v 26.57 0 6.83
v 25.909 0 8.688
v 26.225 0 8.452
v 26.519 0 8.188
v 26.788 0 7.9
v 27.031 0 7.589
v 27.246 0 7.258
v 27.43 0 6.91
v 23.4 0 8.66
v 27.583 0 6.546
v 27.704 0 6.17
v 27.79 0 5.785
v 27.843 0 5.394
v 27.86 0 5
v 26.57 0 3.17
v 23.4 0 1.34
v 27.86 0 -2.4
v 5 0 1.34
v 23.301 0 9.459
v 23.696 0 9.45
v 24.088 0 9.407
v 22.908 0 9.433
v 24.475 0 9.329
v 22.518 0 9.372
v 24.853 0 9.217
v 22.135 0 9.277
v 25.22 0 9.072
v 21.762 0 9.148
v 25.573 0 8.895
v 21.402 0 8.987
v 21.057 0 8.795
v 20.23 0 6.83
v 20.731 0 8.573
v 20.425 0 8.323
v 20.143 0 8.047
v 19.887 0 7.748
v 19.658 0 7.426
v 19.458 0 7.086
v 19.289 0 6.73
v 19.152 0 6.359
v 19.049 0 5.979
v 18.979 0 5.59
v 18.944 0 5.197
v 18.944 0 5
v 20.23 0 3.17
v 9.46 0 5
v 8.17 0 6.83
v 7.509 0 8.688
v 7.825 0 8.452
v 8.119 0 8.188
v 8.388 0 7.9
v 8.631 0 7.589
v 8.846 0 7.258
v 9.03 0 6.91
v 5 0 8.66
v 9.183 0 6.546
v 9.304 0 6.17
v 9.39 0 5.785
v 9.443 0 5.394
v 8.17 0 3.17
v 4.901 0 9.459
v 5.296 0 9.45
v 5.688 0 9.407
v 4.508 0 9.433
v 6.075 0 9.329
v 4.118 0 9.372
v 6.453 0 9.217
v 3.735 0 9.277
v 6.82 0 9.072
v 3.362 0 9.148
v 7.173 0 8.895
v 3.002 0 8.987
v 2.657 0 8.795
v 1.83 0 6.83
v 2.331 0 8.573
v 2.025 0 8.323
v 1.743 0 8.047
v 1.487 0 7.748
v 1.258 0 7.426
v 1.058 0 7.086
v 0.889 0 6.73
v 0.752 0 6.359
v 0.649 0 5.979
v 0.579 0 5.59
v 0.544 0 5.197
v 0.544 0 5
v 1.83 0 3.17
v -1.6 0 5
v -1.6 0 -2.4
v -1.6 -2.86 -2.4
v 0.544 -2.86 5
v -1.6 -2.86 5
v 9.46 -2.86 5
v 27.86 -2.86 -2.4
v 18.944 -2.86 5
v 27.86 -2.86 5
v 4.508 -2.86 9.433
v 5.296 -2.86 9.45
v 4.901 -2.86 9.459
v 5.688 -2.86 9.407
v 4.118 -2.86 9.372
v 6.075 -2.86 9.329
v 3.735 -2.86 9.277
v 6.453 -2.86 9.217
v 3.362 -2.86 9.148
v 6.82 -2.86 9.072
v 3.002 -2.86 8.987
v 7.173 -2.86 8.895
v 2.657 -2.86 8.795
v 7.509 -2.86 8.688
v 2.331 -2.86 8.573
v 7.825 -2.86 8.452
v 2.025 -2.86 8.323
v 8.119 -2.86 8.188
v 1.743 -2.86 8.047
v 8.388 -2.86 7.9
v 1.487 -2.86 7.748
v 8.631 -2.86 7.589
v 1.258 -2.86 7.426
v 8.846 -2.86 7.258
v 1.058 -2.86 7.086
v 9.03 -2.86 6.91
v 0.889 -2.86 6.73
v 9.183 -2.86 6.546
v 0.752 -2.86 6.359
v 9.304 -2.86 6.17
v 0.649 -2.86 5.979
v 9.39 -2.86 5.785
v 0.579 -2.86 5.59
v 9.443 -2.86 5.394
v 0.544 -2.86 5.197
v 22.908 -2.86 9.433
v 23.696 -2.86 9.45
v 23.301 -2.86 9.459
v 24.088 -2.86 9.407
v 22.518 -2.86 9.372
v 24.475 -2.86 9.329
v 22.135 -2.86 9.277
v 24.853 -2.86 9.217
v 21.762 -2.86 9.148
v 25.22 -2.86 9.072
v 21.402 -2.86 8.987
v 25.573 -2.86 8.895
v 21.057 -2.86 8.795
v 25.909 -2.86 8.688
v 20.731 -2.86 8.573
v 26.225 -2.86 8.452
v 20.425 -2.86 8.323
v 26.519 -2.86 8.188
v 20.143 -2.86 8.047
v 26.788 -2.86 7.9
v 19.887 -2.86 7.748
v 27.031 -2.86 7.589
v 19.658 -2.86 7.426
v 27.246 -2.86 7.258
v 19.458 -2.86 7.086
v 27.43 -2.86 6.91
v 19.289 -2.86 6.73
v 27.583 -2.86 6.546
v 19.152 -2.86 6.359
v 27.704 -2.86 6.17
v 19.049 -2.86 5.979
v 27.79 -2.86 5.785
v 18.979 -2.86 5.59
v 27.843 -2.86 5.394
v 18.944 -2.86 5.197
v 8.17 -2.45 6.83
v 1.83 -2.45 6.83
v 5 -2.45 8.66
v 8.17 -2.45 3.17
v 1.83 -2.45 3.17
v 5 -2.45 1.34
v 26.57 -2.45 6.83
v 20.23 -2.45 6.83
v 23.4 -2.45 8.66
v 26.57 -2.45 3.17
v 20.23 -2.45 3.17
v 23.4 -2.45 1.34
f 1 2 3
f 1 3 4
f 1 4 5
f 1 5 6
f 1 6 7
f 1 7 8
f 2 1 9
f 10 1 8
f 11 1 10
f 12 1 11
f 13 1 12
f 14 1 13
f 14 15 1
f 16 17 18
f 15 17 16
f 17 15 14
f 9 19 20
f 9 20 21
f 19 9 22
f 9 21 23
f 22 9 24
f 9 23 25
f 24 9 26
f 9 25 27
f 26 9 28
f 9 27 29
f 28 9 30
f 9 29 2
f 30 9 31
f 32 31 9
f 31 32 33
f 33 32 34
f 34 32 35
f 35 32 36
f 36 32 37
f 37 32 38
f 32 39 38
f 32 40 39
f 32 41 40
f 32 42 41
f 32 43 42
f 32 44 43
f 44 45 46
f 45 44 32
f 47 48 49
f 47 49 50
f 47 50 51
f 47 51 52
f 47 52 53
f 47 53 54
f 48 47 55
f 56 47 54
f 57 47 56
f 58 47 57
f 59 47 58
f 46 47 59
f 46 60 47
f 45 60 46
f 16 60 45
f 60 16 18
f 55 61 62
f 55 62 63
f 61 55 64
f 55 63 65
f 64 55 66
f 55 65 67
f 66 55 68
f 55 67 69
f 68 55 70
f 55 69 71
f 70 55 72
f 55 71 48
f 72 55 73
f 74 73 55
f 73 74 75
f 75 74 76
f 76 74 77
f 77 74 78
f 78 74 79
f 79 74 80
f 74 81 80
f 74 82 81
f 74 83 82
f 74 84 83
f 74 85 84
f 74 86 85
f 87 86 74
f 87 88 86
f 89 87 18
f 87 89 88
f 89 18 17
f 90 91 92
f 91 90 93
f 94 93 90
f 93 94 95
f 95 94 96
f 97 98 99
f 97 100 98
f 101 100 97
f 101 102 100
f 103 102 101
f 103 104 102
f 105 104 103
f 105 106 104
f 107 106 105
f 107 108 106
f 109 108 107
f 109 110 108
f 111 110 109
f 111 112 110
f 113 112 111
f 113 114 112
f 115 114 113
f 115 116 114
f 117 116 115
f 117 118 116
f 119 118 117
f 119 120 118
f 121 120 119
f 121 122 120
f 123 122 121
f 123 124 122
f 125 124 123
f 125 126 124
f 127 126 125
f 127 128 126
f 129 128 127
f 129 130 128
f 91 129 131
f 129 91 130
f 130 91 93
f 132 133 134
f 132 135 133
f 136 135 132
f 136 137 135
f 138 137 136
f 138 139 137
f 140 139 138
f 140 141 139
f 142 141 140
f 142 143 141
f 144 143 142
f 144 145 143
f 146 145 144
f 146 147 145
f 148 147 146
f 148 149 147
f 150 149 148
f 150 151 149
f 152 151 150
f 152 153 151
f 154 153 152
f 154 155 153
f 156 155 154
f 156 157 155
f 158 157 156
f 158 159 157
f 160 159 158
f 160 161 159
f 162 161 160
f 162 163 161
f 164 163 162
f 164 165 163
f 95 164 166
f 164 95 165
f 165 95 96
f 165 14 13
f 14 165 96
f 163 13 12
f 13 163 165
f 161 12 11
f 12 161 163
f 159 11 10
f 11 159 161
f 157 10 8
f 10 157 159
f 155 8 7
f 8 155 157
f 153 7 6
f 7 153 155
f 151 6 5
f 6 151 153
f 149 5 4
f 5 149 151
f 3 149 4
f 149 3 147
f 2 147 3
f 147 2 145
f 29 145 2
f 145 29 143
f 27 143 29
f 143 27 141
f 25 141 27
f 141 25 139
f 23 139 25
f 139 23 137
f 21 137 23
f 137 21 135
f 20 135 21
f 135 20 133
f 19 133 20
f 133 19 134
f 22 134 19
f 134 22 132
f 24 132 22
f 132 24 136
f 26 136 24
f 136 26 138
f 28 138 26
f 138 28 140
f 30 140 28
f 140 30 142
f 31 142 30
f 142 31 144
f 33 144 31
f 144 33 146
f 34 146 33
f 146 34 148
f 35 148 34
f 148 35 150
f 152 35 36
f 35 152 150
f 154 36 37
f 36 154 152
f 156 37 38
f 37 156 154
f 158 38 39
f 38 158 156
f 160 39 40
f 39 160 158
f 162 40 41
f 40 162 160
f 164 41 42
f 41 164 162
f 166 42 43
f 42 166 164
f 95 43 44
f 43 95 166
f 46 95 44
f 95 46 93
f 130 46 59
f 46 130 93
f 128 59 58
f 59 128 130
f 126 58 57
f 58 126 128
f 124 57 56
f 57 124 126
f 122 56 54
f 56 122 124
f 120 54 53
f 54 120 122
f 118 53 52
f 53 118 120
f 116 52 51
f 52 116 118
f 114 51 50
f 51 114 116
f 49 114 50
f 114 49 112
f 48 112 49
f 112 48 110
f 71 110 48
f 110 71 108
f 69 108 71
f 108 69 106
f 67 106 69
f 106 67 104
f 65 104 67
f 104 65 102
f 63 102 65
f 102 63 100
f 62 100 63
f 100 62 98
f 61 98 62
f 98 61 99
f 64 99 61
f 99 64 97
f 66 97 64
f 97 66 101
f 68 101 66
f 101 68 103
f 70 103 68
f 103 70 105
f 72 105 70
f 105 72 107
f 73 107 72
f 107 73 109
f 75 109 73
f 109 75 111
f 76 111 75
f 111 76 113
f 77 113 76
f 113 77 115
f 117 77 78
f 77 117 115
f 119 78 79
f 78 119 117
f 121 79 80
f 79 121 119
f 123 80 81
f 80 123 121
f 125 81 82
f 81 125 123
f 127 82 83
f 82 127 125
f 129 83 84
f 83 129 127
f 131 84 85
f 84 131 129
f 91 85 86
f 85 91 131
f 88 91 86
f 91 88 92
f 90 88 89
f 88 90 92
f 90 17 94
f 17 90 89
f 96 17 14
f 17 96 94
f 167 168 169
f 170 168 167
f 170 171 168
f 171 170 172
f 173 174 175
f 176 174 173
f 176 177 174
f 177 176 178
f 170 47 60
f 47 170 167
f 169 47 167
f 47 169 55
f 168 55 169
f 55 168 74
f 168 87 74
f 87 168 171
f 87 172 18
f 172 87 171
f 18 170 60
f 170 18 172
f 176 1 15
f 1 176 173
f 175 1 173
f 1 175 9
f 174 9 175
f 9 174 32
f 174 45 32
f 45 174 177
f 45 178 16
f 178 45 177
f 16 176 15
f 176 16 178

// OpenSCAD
// Copyright (C) 2025 Arif K. Rafiq
// This program is free software: you can redistribute it and/or modify
// it under the terms of the GNU General Public License as published by
// the Free Software Foundation, either version 3 of the License, or
// (at your option) any later version.

// This program is distributed in the hope that it will be useful,
// but WITHOUT ANY WARRANTY; without even the implied warranty of
// MERCHANTABILITY or FITNESS FOR A PARTICULAR PURPOSE.  See the
// GNU General Public License for more details.

// You should have received a copy of the GNU General Public License
// along with this file.  If not, see <https://www.gnu.org/licenses/>,
// or write to: license@temperedoptimism.com


/* 
(b)readth       :(w)est (X-)   (c)enter (X0) (e)east (X+)
Vectors (v)     :(x), (y), (z)
Thicknesses (t) : Thicknesses to resolve 3D printer limits or rendering issues.
Proportion (p)  : container for grouping (r)adius and (i)ntensity into a singl 2d vector acccessed using .x and .y respectively
*/

// Fixed in example3.scad       // Set limits in customizer
/* [Thicknesses (x),(y),(z)] */
tFitGap = [0.16, 0.16, 0.16];   //[0.00:0.01:0.64] 
tWallMin = [0.40, 0.40, 0.16];  //[0.16:0.08:1.60] 
/* [Proportional (x):(Radius, (y):(i)ntensity] */
pHexSink = [3.5, 2.3];          //[0.10:0.02:20.00] 
/* [2D vectors (x), (y)] */
vTerminalW = [5.0, 5.0];        //[0.00:0.10:100] 
vTerminalE = [23.4, 5.0];       //[0.00:0.10:100] 
/* [Scalars] */
leadingEdge = 2.4; //[0.8:0.4:5.0]
flankEdge = 1.6; //[0.8:0.4:5.0]
bBoard = 28.4; //[20:0.1:100.0]
/* [Special ] */
fa0 = 4.0;     //[1:1:60]  
fs0 = 0.4;     //[0.1:0.1:4.0]  
fx0 = 3;       //[1,2,3,4,5,6,7,8,9,10]
/* [Hidden] */ 
tEps=0.01; 

/* Calucualted at run time. */
pHexSurround = [pHexSink.x + (tWallMin.x * 2) + tFitGap.x, pHexSink.y + tWallMin.y + tFitGap.y];

//30.00-35.00 Circles, Also look at the customizer!!
// Rotate
rotate([90,0,0]){
  difference(){

    linear_extrude(pHexSurround.y, convexity=fx0){ 
      polygon([[vTerminalW.x + pHexSurround.x, vTerminalW.y],
              [ vTerminalW.x + pHexSurround.x, -leadingEdge],
              [-flankEdge, -leadingEdge],       
              [-flankEdge, vTerminalW.y]]);
      polygon([[vTerminalE.x + pHexSurround.x, vTerminalE.y],
              [ vTerminalE.x + pHexSurround.x, -leadingEdge],
              [-flankEdge, -leadingEdge],       
              [-flankEdge, vTerminalE.y]]);
      for(v = [vTerminalW, vTerminalE]){
        translate(v)  circle(pHexSurround.x, $fa=fa0, $fs=fs0 );
      }
    }
    //hex pocket
    // Solve Conflicting bodies                       
    translate([0,0, -tEps]) linear_extrude(pHexSink.y + tFitGap.y, convexity=fx0){
      translate(vTerminalW)  rotate([0,0,30]) circle(pHexSink.x + tFitGap.y, $fn=6);
      translate(vTerminalE)  rotate([0,0,30]) circle(pHexSink.x + tFitGap.y, $fn=6);
    }
  }
}
